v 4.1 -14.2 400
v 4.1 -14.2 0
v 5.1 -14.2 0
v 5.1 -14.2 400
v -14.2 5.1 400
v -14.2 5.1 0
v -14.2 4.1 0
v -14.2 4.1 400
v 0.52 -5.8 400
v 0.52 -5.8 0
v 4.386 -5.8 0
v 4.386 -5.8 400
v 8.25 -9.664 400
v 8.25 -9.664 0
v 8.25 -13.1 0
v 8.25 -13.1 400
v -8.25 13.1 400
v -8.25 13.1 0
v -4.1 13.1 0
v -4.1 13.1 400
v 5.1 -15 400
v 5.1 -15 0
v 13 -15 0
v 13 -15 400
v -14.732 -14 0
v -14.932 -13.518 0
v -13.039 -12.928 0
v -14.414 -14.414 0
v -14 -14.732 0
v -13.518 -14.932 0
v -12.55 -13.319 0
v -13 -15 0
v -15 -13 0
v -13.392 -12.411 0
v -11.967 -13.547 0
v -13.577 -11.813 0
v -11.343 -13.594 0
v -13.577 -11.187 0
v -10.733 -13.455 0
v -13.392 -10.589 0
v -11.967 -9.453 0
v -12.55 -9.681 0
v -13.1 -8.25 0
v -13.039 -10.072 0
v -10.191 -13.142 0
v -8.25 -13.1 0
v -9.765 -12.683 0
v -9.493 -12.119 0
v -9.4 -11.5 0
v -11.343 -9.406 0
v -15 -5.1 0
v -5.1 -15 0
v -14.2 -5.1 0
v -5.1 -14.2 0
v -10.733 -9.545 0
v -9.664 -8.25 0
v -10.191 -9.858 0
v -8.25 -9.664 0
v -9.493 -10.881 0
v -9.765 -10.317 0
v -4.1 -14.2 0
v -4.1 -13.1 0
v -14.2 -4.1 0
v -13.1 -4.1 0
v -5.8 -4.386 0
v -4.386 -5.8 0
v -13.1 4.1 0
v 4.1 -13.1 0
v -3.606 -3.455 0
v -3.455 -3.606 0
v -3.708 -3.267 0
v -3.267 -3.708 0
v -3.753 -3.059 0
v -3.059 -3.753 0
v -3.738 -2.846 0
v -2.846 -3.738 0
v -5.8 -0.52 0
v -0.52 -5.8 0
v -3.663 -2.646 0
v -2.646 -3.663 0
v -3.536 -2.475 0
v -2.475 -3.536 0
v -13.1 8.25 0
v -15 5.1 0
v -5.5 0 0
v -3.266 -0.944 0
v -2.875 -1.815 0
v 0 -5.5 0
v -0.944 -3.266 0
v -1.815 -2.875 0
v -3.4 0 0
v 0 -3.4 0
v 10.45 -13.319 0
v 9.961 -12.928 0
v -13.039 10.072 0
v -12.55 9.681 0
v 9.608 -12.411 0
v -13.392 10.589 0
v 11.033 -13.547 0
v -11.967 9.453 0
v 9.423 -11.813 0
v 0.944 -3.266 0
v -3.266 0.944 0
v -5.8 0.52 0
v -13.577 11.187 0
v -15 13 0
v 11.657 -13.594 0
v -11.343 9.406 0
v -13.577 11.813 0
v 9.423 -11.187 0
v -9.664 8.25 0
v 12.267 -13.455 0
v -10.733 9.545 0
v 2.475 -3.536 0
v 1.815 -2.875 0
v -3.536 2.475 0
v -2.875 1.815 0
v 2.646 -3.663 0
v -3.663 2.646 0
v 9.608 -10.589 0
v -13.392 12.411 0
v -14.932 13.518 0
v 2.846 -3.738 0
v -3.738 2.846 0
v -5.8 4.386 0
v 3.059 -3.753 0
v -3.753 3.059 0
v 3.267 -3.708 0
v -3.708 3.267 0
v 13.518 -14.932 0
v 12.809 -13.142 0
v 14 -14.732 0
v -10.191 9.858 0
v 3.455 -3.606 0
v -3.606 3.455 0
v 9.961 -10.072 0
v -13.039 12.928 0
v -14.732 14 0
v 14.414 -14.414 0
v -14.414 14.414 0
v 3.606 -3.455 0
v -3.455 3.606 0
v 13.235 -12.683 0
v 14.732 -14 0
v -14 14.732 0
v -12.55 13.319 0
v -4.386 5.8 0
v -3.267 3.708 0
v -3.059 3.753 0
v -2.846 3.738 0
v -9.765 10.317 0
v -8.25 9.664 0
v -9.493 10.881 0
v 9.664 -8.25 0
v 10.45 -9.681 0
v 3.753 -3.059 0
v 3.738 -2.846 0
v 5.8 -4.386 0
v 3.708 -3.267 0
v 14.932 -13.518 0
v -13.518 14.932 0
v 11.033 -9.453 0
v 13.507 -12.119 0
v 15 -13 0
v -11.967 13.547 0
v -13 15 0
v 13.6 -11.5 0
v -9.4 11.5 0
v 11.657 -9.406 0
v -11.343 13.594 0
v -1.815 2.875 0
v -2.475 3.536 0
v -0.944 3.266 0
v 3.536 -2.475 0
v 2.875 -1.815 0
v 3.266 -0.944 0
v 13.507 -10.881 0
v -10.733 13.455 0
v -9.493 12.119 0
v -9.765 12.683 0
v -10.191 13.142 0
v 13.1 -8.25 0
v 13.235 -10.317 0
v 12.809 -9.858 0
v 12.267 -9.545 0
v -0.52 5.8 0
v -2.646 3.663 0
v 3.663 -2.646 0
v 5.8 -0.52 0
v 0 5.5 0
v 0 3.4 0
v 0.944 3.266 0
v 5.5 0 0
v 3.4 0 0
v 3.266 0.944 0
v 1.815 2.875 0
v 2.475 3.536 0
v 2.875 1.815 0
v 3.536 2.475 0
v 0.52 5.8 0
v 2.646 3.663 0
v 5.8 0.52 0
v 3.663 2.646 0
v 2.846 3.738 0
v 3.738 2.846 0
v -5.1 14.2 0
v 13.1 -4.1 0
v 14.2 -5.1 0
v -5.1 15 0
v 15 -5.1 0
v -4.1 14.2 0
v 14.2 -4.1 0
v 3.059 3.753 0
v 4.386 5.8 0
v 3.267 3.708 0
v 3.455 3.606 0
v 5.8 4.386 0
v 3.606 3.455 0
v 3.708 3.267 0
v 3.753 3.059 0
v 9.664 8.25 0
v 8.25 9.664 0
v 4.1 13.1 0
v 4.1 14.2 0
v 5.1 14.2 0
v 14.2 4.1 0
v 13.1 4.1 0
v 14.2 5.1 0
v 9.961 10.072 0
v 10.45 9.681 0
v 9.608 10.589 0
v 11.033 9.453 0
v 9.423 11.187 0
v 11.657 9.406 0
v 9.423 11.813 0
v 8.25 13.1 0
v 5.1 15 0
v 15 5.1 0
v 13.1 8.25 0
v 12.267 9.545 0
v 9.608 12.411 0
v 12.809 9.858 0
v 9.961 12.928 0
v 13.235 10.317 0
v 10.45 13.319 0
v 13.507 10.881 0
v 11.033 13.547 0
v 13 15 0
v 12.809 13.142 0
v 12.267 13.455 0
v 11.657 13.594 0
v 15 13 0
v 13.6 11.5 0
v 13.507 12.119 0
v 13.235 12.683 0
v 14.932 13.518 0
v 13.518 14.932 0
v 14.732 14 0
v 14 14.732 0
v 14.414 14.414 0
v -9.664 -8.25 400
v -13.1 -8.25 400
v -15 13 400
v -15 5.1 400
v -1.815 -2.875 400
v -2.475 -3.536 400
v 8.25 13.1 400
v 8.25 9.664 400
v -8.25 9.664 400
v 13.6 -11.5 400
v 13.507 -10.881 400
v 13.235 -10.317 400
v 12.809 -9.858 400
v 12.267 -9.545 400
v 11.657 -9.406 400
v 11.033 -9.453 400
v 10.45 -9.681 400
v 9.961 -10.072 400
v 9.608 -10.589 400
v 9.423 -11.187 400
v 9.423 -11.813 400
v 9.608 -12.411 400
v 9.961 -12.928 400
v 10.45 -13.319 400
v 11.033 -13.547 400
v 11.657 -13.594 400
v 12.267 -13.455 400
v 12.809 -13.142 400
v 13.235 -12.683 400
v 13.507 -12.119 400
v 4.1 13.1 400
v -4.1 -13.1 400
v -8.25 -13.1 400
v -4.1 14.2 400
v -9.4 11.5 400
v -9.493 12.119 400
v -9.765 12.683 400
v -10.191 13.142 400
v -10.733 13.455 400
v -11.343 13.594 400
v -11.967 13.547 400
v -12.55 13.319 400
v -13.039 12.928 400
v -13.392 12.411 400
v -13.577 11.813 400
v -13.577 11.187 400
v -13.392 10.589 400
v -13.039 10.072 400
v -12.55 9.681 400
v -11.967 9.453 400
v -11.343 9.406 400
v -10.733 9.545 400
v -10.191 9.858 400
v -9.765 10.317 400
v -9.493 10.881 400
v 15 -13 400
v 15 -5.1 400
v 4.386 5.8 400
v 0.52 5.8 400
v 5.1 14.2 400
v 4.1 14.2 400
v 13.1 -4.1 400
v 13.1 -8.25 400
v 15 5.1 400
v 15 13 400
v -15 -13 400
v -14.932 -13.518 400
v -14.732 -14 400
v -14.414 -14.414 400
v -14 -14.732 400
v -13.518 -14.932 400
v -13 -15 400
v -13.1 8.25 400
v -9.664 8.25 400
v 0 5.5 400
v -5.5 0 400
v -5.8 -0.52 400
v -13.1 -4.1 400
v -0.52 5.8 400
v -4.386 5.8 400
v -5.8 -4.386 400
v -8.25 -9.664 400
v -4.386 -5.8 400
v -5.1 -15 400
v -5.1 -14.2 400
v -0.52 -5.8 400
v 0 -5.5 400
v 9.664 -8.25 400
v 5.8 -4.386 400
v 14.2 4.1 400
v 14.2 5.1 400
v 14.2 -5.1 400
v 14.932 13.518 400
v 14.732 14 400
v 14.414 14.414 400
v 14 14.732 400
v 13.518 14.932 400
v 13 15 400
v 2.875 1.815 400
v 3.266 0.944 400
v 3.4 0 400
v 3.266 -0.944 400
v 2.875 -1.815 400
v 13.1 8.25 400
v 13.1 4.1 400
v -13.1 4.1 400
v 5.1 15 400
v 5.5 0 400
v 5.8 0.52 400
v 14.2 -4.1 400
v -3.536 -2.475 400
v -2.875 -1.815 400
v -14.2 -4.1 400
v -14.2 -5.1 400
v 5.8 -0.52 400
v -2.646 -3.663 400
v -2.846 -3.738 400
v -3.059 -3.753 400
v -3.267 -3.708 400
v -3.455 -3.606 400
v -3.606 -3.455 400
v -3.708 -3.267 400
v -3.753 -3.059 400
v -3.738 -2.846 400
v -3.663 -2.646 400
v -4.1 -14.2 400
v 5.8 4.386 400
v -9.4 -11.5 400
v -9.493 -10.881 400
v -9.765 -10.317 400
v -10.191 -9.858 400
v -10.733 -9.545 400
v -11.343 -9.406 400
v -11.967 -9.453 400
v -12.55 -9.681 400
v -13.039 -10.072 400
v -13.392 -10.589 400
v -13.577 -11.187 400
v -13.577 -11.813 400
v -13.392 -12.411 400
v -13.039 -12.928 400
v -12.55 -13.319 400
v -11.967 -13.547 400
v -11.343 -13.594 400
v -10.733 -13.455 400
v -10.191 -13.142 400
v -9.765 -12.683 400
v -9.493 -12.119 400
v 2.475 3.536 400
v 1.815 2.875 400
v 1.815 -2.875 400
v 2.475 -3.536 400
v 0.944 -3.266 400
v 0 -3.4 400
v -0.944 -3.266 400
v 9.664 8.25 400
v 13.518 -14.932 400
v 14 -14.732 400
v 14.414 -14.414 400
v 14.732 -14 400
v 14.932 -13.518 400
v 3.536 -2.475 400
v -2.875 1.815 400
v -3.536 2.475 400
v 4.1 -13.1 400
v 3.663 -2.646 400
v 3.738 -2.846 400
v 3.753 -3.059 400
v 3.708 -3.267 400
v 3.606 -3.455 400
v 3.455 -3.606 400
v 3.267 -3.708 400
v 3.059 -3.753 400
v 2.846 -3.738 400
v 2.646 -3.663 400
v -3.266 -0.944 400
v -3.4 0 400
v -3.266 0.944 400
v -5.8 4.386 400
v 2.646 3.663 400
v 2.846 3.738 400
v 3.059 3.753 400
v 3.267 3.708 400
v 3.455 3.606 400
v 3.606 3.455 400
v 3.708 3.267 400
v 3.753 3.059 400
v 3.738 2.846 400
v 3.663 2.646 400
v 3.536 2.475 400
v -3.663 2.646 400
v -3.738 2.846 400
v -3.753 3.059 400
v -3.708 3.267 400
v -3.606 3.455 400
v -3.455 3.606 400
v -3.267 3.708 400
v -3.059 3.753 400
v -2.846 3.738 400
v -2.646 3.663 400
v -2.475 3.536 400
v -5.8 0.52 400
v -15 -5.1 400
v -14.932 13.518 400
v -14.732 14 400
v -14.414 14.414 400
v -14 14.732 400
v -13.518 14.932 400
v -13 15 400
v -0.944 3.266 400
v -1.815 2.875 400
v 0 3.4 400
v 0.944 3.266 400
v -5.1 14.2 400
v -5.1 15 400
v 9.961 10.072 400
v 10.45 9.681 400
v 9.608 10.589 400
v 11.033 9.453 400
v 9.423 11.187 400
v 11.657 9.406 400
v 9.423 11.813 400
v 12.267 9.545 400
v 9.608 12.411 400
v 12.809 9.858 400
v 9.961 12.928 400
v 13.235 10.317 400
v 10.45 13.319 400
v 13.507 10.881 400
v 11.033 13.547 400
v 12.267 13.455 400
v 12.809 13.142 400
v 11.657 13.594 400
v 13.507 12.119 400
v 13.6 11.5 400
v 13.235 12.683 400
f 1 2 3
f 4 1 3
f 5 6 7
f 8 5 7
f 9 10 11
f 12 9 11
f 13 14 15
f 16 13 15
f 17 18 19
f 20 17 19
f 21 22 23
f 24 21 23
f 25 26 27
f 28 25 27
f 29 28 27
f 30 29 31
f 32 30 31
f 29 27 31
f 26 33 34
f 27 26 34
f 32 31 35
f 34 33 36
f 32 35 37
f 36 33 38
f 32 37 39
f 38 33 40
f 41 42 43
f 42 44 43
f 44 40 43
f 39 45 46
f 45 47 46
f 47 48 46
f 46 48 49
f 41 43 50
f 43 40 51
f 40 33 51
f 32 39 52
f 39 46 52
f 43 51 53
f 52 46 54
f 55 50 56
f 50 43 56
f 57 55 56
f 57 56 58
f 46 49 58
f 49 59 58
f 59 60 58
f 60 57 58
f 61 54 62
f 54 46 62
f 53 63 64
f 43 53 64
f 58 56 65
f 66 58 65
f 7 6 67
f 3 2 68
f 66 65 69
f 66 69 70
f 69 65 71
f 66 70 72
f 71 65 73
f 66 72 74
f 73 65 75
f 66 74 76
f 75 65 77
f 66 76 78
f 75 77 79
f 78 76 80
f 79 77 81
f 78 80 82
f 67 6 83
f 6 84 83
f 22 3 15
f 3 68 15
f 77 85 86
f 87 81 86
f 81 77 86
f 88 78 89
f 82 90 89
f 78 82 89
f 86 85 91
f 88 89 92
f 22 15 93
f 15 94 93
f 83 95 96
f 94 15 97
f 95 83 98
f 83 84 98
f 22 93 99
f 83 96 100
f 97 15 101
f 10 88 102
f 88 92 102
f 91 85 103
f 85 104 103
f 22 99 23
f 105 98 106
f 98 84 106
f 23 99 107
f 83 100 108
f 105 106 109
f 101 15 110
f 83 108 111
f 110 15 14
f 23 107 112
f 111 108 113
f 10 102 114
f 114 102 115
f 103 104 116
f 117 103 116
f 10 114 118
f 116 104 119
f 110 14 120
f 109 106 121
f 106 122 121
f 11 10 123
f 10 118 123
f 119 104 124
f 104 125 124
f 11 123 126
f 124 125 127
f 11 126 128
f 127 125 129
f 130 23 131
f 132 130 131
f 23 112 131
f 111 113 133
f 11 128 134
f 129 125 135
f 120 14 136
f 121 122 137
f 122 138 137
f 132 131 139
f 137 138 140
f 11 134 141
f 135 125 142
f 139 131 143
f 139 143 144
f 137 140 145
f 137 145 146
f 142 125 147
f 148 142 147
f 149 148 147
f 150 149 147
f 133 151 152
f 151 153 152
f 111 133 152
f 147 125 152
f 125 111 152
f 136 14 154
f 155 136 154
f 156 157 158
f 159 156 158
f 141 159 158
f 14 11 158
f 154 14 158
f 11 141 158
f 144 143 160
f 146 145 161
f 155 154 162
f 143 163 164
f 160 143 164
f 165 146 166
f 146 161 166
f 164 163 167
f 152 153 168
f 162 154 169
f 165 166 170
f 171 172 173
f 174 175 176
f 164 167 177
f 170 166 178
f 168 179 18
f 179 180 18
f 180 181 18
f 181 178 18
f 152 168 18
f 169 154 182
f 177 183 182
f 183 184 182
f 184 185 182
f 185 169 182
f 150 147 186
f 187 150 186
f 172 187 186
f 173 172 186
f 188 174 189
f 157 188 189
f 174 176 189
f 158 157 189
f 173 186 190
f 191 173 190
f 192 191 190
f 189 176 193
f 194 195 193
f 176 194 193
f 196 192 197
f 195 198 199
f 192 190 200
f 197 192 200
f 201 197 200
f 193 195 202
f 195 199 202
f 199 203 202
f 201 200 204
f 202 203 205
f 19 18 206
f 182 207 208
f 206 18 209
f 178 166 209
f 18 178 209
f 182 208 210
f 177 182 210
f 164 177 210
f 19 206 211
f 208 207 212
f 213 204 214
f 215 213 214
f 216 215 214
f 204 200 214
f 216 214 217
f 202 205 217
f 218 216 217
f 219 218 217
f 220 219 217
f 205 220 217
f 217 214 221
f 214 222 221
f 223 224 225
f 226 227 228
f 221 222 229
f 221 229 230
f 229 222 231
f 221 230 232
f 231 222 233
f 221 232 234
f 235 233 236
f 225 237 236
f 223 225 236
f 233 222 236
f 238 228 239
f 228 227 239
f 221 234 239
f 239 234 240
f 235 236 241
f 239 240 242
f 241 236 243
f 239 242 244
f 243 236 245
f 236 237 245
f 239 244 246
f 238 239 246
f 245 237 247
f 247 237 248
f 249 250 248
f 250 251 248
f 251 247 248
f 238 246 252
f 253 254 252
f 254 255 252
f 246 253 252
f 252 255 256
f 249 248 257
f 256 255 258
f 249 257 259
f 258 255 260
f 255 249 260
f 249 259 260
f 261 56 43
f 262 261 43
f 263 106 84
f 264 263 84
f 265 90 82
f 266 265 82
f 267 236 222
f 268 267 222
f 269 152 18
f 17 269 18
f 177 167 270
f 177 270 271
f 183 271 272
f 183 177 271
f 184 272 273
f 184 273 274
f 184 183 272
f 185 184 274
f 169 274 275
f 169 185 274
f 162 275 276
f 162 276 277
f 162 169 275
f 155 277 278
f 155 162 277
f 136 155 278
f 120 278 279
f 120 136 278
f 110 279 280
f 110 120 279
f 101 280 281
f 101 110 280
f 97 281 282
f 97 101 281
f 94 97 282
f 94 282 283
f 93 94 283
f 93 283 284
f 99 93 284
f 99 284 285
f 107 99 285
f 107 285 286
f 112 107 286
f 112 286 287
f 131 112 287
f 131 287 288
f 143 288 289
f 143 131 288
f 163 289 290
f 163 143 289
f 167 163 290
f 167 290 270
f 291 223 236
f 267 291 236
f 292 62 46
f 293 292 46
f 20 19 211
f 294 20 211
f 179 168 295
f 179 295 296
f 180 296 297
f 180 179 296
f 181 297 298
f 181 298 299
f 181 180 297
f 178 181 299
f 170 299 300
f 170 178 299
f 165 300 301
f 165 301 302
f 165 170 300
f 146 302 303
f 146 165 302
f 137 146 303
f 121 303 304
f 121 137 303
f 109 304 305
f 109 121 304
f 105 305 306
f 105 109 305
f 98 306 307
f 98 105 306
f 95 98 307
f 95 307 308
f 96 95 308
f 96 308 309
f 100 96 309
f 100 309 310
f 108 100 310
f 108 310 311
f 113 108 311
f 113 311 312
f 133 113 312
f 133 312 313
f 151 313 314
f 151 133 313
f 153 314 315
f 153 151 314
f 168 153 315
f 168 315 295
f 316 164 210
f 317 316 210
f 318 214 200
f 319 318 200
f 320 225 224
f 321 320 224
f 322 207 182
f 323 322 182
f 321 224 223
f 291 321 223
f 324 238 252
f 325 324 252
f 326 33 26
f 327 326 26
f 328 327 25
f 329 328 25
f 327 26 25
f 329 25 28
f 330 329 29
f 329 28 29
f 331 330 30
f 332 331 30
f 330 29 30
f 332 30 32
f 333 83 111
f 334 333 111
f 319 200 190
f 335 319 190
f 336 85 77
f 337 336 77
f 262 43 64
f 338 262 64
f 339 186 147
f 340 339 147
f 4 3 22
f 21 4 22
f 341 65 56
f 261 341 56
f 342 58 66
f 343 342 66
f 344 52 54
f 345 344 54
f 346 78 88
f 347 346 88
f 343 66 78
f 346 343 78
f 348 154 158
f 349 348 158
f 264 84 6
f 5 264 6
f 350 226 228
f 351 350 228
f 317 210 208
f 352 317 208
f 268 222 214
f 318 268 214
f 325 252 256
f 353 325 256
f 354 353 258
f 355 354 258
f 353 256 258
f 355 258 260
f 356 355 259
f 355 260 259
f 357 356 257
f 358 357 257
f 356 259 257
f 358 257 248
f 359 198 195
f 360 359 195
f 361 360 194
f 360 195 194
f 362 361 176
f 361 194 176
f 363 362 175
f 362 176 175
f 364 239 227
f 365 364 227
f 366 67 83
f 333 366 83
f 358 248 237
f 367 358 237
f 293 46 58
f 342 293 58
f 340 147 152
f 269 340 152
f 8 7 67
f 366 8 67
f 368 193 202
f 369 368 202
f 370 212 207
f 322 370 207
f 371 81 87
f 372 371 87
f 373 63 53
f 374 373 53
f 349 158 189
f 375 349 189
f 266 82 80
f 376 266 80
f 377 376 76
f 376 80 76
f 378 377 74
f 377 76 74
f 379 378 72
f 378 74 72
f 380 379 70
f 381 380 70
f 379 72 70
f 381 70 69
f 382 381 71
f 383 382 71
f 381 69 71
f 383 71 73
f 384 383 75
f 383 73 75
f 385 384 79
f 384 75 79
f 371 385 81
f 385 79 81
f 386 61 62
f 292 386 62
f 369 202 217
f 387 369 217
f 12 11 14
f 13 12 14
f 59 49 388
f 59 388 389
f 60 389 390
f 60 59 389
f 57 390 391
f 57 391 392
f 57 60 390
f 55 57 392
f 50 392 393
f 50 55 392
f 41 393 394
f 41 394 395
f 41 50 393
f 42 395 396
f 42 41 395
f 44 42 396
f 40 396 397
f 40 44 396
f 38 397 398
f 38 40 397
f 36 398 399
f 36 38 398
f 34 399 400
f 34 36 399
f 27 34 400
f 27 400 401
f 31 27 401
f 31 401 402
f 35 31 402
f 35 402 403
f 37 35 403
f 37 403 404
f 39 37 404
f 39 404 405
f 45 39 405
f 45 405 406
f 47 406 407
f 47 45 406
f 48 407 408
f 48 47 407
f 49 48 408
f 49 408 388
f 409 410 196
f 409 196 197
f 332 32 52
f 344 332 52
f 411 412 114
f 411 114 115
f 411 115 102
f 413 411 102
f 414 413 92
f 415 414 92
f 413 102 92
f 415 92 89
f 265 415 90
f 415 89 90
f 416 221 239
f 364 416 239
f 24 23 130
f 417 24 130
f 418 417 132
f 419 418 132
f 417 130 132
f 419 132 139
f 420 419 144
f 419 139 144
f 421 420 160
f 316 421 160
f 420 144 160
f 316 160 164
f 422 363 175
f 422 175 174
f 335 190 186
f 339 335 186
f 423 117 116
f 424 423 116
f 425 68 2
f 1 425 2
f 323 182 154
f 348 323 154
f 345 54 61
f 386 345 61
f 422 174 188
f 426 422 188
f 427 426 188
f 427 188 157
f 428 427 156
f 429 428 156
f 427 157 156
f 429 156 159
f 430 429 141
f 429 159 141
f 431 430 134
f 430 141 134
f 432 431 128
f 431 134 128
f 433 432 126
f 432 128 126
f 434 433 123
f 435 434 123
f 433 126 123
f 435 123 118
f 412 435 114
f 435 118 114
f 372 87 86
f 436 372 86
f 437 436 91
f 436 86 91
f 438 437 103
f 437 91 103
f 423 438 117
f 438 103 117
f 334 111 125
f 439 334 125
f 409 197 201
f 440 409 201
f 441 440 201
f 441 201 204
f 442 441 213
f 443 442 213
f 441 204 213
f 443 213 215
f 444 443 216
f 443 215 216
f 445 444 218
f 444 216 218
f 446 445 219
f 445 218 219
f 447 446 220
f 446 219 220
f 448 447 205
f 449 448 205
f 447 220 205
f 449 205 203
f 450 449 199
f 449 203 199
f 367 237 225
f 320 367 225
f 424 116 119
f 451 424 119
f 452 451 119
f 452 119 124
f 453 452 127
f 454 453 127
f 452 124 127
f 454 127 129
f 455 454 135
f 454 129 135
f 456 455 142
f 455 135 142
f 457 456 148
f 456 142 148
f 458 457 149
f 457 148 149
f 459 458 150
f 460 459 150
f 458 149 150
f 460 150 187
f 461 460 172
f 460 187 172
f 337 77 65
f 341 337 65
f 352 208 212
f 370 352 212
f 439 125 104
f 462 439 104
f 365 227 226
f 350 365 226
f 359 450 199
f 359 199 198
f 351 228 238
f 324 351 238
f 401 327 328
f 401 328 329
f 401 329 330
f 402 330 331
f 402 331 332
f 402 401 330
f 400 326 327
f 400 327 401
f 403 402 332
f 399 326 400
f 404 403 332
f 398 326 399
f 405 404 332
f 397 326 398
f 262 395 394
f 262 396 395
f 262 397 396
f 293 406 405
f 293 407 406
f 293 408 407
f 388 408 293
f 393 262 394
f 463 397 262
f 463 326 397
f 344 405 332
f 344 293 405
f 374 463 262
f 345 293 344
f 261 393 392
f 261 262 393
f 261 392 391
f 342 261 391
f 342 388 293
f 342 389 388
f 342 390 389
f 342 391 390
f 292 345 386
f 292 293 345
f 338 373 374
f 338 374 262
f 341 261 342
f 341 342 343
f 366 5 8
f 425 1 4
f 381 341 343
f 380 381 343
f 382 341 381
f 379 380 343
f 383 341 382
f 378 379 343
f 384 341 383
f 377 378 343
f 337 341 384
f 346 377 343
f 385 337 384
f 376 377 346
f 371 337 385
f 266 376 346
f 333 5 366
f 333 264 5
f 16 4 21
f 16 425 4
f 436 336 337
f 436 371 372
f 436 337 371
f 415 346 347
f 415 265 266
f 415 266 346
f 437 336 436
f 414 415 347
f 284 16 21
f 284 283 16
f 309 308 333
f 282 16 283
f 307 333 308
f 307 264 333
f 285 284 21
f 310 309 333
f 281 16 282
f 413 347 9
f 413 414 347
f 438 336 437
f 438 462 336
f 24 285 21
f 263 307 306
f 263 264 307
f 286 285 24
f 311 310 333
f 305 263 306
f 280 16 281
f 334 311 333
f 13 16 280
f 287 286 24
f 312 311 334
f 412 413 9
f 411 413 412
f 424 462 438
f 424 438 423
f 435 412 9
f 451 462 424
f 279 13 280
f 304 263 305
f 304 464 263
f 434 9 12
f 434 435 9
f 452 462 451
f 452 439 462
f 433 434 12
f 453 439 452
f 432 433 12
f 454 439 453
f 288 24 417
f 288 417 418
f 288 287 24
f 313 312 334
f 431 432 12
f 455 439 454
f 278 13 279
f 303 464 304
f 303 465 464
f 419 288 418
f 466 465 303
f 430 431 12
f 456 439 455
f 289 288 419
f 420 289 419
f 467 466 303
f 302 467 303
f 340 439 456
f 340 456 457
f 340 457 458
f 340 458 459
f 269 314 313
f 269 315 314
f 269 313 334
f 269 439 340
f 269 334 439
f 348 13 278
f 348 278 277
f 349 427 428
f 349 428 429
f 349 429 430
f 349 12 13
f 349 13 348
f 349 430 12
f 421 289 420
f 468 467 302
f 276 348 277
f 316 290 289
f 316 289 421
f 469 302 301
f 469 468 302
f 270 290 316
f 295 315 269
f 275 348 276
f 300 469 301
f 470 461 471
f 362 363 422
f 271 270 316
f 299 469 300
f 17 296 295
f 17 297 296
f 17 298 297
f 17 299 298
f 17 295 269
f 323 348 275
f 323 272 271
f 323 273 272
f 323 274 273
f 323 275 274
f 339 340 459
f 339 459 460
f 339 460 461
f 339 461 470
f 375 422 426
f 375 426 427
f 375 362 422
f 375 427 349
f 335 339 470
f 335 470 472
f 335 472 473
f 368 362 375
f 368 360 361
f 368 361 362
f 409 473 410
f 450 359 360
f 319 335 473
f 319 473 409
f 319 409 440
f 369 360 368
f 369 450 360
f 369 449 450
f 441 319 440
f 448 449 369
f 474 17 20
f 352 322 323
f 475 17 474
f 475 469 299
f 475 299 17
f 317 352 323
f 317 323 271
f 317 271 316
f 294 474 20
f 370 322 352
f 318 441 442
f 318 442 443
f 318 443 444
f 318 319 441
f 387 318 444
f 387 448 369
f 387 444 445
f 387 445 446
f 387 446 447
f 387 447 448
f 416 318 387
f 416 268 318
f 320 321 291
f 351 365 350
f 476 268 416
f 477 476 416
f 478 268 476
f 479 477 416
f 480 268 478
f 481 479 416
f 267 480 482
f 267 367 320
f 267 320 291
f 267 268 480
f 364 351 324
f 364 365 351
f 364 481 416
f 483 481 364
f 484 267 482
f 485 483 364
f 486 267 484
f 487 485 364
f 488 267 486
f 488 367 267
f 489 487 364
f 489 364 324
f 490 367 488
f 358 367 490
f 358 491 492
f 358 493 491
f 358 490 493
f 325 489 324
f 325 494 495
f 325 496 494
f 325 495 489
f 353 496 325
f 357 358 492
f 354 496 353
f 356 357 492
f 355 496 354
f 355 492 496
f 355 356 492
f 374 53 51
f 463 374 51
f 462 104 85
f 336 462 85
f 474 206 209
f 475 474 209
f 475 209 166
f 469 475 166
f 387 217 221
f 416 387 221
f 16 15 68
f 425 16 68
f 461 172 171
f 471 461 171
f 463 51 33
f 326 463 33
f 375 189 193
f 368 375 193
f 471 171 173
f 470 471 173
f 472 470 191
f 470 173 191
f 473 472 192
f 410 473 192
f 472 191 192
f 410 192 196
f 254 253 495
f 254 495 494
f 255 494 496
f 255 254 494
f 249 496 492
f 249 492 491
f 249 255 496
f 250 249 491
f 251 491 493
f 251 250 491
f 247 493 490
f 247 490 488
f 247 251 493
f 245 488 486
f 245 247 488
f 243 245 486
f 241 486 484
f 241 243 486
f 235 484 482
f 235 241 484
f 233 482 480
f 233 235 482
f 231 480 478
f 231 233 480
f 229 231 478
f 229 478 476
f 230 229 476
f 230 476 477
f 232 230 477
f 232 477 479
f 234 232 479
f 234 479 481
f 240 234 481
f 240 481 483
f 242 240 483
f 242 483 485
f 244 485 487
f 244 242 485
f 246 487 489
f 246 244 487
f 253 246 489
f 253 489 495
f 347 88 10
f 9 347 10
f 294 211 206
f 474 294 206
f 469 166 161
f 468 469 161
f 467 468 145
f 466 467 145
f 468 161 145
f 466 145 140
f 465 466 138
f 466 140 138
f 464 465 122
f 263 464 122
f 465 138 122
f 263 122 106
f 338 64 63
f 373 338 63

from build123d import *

# Parameters (mm, degrees)
SKETCH_28_R     = 2.1
EXTRUDE_1_DEPTH = 400


with BuildPart() as part:
    # 草图28 → 凸台-拉伸1 (new body)
    with BuildSketch(Plane.XY):
        with BuildLine():
            Line((-5.5, 0), (-5.8, -0.519615242))
            Line((-5.8, -0.519615242), (-5.8, -4.385786438))
            Line((-5.8, -4.385786438), (-9.664213562, -8.25))
            Line((-9.664213562, -8.25), (-13.1, -8.25))
            Line((-13.1, -8.25), (-13.1, -4.1))
            Line((-13.1, -4.1), (-14.2, -4.1))
            Line((-14.2, -4.1), (-14.2, -5.1))
            Line((-14.2, -5.1), (-15, -5.1))
            Line((-15, -5.1), (-15, -13))
            ThreePointArc((-15, -13), (-14.414213562, -14.414213562), (-13, -15))
            Line((-13, -15), (-5.1, -15))
            Line((-5.1, -15), (-5.1, -14.2))
            Line((-5.1, -14.2), (-4.1, -14.2))
            Line((-4.1, -14.2), (-4.1, -13.1))
            Line((-4.1, -13.1), (-8.25, -13.1))
            Line((-8.25, -13.1), (-8.25, -9.664213562))
            Line((-8.25, -9.664213562), (-4.385786438, -5.8))
            Line((-4.385786438, -5.8), (-0.519615242, -5.8))
            Line((-0.519615242, -5.8), (0, -5.5))
            Line((0, -5.5), (0.519615242, -5.8))
            Line((0.519615242, -5.8), (4.385786438, -5.8))
            Line((4.385786438, -5.8), (8.25, -9.664213562))
            Line((8.25, -9.664213562), (8.25, -13.1))
            Line((8.25, -13.1), (4.1, -13.1))
            Line((4.1, -13.1), (4.1, -14.2))
            Line((4.1, -14.2), (5.1, -14.2))
            Line((5.1, -14.2), (5.1, -15))
            Line((5.1, -15), (13, -15))
            ThreePointArc((13, -15), (14.414213562, -14.414213562), (15, -13))
            Line((15, -13), (15, -5.1))
            Line((15, -5.1), (14.2, -5.1))
            Line((14.2, -5.1), (14.2, -4.1))
            Line((14.2, -4.1), (13.1, -4.1))
            Line((13.1, -4.1), (13.1, -8.25))
            Line((13.1, -8.25), (9.664213562, -8.25))
            Line((9.664213562, -8.25), (5.8, -4.385786438))
            Line((5.8, -4.385786438), (5.8, -0.519615242))
            Line((5.8, -0.519615242), (5.5, 0))
            Line((5.5, 0), (5.8, 0.519615242))
            Line((5.8, 0.519615242), (5.8, 4.385786438))
            Line((5.8, 4.385786438), (9.664213562, 8.25))
            Line((9.664213562, 8.25), (13.1, 8.25))
            Line((13.1, 8.25), (13.1, 4.1))
            Line((13.1, 4.1), (14.2, 4.1))
            Line((14.2, 4.1), (14.2, 5.1))
            Line((14.2, 5.1), (15, 5.1))
            Line((15, 5.1), (15, 13))
            ThreePointArc((15, 13), (14.414213562, 14.414213562), (13, 15))
            Line((13, 15), (5.1, 15))
            Line((5.1, 15), (5.1, 14.2))
            Line((5.1, 14.2), (4.1, 14.2))
            Line((4.1, 14.2), (4.1, 13.1))
            Line((4.1, 13.1), (8.25, 13.1))
            Line((8.25, 13.1), (8.25, 9.664213562))
            Line((8.25, 9.664213562), (4.385786438, 5.8))
            Line((4.385786438, 5.8), (0.519615242, 5.8))
            Line((0.519615242, 5.8), (0, 5.5))
            Line((0, 5.5), (-0.519615242, 5.8))
            Line((-0.519615242, 5.8), (-4.385786438, 5.8))
            Line((-4.385786438, 5.8), (-8.25, 9.664213562))
            Line((-8.25, 9.664213562), (-8.25, 13.1))
            Line((-8.25, 13.1), (-4.1, 13.1))
            Line((-4.1, 13.1), (-4.1, 14.2))
            Line((-4.1, 14.2), (-5.1, 14.2))
            Line((-5.1, 14.2), (-5.1, 15))
            Line((-5.1, 15), (-13, 15))
            ThreePointArc((-13, 15), (-14.414213562, 14.414213562), (-15, 13))
            Line((-15, 13), (-15, 5.1))
            Line((-15, 5.1), (-14.2, 5.1))
            Line((-14.2, 5.1), (-14.2, 4.1))
            Line((-14.2, 4.1), (-13.1, 4.1))
            Line((-13.1, 4.1), (-13.1, 8.25))
            Line((-13.1, 8.25), (-9.664213562, 8.25))
            Line((-9.664213562, 8.25), (-5.8, 4.385786438))
            Line((-5.8, 4.385786438), (-5.8, 0.519615242))
            Line((-5.8, 0.519615242), (-5.5, 0))
        make_face()
        with Locations((11.5, -11.5)):
            Circle(SKETCH_28_R, mode=Mode.SUBTRACT)
        with Locations((-11.5, -11.5)):
            Circle(SKETCH_28_R, mode=Mode.SUBTRACT)
        with Locations((11.5, 11.5)):
            Circle(SKETCH_28_R, mode=Mode.SUBTRACT)
        with Locations((-11.5, 11.5)):
            Circle(SKETCH_28_R, mode=Mode.SUBTRACT)
        with BuildLine():
            Line((2.474873733, -3.535533907), (1.814611277, -2.875271451))
            ThreePointArc((1.814611277, -2.875271451), (0, -3.400000001), (-1.814611277, -2.875271452))
            Line((-1.814611277, -2.875271452), (-2.47487373, -3.535533905))
            ThreePointArc((-2.47487373, -3.535533905), (-3.535533904, -3.535533907), (-3.535533905, -2.474873733))
            Line((-3.535533905, -2.474873733), (-2.875271451, -1.814611279))
            ThreePointArc((-2.875271451, -1.814611279), (-3.400000001, 0), (-2.87527145, 1.814611278))
            Line((-2.87527145, 1.814611278), (-3.535533908, 2.474873736))
            ThreePointArc((-3.535533908, 2.474873736), (-3.535533907, 3.535533907), (-2.474873737, 3.535533906))
            Line((-2.474873737, 3.535533906), (-1.814611279, 2.875271449))
            ThreePointArc((-1.814611279, 2.875271449), (-1e-09, 3.399999999), (1.814611277, 2.875271449))
            Line((1.814611277, 2.875271449), (2.474873733, 3.535533905))
            ThreePointArc((2.474873733, 3.535533905), (3.535533905, 3.535533905), (3.535533905, 2.474873733))
            Line((3.535533905, 2.474873733), (2.875271449, 1.814611277))
            ThreePointArc((2.875271449, 1.814611277), (3.399999999, -1e-09), (2.875271449, -1.814611279))
            Line((2.875271449, -1.814611279), (3.535533905, -2.474873735))
            ThreePointArc((3.535533905, -2.474873735), (3.535533905, -3.535533907), (2.474873733, -3.535533907))
        make_face(mode=Mode.SUBTRACT)
    extrude(amount=EXTRUDE_1_DEPTH)


solid = part.part
